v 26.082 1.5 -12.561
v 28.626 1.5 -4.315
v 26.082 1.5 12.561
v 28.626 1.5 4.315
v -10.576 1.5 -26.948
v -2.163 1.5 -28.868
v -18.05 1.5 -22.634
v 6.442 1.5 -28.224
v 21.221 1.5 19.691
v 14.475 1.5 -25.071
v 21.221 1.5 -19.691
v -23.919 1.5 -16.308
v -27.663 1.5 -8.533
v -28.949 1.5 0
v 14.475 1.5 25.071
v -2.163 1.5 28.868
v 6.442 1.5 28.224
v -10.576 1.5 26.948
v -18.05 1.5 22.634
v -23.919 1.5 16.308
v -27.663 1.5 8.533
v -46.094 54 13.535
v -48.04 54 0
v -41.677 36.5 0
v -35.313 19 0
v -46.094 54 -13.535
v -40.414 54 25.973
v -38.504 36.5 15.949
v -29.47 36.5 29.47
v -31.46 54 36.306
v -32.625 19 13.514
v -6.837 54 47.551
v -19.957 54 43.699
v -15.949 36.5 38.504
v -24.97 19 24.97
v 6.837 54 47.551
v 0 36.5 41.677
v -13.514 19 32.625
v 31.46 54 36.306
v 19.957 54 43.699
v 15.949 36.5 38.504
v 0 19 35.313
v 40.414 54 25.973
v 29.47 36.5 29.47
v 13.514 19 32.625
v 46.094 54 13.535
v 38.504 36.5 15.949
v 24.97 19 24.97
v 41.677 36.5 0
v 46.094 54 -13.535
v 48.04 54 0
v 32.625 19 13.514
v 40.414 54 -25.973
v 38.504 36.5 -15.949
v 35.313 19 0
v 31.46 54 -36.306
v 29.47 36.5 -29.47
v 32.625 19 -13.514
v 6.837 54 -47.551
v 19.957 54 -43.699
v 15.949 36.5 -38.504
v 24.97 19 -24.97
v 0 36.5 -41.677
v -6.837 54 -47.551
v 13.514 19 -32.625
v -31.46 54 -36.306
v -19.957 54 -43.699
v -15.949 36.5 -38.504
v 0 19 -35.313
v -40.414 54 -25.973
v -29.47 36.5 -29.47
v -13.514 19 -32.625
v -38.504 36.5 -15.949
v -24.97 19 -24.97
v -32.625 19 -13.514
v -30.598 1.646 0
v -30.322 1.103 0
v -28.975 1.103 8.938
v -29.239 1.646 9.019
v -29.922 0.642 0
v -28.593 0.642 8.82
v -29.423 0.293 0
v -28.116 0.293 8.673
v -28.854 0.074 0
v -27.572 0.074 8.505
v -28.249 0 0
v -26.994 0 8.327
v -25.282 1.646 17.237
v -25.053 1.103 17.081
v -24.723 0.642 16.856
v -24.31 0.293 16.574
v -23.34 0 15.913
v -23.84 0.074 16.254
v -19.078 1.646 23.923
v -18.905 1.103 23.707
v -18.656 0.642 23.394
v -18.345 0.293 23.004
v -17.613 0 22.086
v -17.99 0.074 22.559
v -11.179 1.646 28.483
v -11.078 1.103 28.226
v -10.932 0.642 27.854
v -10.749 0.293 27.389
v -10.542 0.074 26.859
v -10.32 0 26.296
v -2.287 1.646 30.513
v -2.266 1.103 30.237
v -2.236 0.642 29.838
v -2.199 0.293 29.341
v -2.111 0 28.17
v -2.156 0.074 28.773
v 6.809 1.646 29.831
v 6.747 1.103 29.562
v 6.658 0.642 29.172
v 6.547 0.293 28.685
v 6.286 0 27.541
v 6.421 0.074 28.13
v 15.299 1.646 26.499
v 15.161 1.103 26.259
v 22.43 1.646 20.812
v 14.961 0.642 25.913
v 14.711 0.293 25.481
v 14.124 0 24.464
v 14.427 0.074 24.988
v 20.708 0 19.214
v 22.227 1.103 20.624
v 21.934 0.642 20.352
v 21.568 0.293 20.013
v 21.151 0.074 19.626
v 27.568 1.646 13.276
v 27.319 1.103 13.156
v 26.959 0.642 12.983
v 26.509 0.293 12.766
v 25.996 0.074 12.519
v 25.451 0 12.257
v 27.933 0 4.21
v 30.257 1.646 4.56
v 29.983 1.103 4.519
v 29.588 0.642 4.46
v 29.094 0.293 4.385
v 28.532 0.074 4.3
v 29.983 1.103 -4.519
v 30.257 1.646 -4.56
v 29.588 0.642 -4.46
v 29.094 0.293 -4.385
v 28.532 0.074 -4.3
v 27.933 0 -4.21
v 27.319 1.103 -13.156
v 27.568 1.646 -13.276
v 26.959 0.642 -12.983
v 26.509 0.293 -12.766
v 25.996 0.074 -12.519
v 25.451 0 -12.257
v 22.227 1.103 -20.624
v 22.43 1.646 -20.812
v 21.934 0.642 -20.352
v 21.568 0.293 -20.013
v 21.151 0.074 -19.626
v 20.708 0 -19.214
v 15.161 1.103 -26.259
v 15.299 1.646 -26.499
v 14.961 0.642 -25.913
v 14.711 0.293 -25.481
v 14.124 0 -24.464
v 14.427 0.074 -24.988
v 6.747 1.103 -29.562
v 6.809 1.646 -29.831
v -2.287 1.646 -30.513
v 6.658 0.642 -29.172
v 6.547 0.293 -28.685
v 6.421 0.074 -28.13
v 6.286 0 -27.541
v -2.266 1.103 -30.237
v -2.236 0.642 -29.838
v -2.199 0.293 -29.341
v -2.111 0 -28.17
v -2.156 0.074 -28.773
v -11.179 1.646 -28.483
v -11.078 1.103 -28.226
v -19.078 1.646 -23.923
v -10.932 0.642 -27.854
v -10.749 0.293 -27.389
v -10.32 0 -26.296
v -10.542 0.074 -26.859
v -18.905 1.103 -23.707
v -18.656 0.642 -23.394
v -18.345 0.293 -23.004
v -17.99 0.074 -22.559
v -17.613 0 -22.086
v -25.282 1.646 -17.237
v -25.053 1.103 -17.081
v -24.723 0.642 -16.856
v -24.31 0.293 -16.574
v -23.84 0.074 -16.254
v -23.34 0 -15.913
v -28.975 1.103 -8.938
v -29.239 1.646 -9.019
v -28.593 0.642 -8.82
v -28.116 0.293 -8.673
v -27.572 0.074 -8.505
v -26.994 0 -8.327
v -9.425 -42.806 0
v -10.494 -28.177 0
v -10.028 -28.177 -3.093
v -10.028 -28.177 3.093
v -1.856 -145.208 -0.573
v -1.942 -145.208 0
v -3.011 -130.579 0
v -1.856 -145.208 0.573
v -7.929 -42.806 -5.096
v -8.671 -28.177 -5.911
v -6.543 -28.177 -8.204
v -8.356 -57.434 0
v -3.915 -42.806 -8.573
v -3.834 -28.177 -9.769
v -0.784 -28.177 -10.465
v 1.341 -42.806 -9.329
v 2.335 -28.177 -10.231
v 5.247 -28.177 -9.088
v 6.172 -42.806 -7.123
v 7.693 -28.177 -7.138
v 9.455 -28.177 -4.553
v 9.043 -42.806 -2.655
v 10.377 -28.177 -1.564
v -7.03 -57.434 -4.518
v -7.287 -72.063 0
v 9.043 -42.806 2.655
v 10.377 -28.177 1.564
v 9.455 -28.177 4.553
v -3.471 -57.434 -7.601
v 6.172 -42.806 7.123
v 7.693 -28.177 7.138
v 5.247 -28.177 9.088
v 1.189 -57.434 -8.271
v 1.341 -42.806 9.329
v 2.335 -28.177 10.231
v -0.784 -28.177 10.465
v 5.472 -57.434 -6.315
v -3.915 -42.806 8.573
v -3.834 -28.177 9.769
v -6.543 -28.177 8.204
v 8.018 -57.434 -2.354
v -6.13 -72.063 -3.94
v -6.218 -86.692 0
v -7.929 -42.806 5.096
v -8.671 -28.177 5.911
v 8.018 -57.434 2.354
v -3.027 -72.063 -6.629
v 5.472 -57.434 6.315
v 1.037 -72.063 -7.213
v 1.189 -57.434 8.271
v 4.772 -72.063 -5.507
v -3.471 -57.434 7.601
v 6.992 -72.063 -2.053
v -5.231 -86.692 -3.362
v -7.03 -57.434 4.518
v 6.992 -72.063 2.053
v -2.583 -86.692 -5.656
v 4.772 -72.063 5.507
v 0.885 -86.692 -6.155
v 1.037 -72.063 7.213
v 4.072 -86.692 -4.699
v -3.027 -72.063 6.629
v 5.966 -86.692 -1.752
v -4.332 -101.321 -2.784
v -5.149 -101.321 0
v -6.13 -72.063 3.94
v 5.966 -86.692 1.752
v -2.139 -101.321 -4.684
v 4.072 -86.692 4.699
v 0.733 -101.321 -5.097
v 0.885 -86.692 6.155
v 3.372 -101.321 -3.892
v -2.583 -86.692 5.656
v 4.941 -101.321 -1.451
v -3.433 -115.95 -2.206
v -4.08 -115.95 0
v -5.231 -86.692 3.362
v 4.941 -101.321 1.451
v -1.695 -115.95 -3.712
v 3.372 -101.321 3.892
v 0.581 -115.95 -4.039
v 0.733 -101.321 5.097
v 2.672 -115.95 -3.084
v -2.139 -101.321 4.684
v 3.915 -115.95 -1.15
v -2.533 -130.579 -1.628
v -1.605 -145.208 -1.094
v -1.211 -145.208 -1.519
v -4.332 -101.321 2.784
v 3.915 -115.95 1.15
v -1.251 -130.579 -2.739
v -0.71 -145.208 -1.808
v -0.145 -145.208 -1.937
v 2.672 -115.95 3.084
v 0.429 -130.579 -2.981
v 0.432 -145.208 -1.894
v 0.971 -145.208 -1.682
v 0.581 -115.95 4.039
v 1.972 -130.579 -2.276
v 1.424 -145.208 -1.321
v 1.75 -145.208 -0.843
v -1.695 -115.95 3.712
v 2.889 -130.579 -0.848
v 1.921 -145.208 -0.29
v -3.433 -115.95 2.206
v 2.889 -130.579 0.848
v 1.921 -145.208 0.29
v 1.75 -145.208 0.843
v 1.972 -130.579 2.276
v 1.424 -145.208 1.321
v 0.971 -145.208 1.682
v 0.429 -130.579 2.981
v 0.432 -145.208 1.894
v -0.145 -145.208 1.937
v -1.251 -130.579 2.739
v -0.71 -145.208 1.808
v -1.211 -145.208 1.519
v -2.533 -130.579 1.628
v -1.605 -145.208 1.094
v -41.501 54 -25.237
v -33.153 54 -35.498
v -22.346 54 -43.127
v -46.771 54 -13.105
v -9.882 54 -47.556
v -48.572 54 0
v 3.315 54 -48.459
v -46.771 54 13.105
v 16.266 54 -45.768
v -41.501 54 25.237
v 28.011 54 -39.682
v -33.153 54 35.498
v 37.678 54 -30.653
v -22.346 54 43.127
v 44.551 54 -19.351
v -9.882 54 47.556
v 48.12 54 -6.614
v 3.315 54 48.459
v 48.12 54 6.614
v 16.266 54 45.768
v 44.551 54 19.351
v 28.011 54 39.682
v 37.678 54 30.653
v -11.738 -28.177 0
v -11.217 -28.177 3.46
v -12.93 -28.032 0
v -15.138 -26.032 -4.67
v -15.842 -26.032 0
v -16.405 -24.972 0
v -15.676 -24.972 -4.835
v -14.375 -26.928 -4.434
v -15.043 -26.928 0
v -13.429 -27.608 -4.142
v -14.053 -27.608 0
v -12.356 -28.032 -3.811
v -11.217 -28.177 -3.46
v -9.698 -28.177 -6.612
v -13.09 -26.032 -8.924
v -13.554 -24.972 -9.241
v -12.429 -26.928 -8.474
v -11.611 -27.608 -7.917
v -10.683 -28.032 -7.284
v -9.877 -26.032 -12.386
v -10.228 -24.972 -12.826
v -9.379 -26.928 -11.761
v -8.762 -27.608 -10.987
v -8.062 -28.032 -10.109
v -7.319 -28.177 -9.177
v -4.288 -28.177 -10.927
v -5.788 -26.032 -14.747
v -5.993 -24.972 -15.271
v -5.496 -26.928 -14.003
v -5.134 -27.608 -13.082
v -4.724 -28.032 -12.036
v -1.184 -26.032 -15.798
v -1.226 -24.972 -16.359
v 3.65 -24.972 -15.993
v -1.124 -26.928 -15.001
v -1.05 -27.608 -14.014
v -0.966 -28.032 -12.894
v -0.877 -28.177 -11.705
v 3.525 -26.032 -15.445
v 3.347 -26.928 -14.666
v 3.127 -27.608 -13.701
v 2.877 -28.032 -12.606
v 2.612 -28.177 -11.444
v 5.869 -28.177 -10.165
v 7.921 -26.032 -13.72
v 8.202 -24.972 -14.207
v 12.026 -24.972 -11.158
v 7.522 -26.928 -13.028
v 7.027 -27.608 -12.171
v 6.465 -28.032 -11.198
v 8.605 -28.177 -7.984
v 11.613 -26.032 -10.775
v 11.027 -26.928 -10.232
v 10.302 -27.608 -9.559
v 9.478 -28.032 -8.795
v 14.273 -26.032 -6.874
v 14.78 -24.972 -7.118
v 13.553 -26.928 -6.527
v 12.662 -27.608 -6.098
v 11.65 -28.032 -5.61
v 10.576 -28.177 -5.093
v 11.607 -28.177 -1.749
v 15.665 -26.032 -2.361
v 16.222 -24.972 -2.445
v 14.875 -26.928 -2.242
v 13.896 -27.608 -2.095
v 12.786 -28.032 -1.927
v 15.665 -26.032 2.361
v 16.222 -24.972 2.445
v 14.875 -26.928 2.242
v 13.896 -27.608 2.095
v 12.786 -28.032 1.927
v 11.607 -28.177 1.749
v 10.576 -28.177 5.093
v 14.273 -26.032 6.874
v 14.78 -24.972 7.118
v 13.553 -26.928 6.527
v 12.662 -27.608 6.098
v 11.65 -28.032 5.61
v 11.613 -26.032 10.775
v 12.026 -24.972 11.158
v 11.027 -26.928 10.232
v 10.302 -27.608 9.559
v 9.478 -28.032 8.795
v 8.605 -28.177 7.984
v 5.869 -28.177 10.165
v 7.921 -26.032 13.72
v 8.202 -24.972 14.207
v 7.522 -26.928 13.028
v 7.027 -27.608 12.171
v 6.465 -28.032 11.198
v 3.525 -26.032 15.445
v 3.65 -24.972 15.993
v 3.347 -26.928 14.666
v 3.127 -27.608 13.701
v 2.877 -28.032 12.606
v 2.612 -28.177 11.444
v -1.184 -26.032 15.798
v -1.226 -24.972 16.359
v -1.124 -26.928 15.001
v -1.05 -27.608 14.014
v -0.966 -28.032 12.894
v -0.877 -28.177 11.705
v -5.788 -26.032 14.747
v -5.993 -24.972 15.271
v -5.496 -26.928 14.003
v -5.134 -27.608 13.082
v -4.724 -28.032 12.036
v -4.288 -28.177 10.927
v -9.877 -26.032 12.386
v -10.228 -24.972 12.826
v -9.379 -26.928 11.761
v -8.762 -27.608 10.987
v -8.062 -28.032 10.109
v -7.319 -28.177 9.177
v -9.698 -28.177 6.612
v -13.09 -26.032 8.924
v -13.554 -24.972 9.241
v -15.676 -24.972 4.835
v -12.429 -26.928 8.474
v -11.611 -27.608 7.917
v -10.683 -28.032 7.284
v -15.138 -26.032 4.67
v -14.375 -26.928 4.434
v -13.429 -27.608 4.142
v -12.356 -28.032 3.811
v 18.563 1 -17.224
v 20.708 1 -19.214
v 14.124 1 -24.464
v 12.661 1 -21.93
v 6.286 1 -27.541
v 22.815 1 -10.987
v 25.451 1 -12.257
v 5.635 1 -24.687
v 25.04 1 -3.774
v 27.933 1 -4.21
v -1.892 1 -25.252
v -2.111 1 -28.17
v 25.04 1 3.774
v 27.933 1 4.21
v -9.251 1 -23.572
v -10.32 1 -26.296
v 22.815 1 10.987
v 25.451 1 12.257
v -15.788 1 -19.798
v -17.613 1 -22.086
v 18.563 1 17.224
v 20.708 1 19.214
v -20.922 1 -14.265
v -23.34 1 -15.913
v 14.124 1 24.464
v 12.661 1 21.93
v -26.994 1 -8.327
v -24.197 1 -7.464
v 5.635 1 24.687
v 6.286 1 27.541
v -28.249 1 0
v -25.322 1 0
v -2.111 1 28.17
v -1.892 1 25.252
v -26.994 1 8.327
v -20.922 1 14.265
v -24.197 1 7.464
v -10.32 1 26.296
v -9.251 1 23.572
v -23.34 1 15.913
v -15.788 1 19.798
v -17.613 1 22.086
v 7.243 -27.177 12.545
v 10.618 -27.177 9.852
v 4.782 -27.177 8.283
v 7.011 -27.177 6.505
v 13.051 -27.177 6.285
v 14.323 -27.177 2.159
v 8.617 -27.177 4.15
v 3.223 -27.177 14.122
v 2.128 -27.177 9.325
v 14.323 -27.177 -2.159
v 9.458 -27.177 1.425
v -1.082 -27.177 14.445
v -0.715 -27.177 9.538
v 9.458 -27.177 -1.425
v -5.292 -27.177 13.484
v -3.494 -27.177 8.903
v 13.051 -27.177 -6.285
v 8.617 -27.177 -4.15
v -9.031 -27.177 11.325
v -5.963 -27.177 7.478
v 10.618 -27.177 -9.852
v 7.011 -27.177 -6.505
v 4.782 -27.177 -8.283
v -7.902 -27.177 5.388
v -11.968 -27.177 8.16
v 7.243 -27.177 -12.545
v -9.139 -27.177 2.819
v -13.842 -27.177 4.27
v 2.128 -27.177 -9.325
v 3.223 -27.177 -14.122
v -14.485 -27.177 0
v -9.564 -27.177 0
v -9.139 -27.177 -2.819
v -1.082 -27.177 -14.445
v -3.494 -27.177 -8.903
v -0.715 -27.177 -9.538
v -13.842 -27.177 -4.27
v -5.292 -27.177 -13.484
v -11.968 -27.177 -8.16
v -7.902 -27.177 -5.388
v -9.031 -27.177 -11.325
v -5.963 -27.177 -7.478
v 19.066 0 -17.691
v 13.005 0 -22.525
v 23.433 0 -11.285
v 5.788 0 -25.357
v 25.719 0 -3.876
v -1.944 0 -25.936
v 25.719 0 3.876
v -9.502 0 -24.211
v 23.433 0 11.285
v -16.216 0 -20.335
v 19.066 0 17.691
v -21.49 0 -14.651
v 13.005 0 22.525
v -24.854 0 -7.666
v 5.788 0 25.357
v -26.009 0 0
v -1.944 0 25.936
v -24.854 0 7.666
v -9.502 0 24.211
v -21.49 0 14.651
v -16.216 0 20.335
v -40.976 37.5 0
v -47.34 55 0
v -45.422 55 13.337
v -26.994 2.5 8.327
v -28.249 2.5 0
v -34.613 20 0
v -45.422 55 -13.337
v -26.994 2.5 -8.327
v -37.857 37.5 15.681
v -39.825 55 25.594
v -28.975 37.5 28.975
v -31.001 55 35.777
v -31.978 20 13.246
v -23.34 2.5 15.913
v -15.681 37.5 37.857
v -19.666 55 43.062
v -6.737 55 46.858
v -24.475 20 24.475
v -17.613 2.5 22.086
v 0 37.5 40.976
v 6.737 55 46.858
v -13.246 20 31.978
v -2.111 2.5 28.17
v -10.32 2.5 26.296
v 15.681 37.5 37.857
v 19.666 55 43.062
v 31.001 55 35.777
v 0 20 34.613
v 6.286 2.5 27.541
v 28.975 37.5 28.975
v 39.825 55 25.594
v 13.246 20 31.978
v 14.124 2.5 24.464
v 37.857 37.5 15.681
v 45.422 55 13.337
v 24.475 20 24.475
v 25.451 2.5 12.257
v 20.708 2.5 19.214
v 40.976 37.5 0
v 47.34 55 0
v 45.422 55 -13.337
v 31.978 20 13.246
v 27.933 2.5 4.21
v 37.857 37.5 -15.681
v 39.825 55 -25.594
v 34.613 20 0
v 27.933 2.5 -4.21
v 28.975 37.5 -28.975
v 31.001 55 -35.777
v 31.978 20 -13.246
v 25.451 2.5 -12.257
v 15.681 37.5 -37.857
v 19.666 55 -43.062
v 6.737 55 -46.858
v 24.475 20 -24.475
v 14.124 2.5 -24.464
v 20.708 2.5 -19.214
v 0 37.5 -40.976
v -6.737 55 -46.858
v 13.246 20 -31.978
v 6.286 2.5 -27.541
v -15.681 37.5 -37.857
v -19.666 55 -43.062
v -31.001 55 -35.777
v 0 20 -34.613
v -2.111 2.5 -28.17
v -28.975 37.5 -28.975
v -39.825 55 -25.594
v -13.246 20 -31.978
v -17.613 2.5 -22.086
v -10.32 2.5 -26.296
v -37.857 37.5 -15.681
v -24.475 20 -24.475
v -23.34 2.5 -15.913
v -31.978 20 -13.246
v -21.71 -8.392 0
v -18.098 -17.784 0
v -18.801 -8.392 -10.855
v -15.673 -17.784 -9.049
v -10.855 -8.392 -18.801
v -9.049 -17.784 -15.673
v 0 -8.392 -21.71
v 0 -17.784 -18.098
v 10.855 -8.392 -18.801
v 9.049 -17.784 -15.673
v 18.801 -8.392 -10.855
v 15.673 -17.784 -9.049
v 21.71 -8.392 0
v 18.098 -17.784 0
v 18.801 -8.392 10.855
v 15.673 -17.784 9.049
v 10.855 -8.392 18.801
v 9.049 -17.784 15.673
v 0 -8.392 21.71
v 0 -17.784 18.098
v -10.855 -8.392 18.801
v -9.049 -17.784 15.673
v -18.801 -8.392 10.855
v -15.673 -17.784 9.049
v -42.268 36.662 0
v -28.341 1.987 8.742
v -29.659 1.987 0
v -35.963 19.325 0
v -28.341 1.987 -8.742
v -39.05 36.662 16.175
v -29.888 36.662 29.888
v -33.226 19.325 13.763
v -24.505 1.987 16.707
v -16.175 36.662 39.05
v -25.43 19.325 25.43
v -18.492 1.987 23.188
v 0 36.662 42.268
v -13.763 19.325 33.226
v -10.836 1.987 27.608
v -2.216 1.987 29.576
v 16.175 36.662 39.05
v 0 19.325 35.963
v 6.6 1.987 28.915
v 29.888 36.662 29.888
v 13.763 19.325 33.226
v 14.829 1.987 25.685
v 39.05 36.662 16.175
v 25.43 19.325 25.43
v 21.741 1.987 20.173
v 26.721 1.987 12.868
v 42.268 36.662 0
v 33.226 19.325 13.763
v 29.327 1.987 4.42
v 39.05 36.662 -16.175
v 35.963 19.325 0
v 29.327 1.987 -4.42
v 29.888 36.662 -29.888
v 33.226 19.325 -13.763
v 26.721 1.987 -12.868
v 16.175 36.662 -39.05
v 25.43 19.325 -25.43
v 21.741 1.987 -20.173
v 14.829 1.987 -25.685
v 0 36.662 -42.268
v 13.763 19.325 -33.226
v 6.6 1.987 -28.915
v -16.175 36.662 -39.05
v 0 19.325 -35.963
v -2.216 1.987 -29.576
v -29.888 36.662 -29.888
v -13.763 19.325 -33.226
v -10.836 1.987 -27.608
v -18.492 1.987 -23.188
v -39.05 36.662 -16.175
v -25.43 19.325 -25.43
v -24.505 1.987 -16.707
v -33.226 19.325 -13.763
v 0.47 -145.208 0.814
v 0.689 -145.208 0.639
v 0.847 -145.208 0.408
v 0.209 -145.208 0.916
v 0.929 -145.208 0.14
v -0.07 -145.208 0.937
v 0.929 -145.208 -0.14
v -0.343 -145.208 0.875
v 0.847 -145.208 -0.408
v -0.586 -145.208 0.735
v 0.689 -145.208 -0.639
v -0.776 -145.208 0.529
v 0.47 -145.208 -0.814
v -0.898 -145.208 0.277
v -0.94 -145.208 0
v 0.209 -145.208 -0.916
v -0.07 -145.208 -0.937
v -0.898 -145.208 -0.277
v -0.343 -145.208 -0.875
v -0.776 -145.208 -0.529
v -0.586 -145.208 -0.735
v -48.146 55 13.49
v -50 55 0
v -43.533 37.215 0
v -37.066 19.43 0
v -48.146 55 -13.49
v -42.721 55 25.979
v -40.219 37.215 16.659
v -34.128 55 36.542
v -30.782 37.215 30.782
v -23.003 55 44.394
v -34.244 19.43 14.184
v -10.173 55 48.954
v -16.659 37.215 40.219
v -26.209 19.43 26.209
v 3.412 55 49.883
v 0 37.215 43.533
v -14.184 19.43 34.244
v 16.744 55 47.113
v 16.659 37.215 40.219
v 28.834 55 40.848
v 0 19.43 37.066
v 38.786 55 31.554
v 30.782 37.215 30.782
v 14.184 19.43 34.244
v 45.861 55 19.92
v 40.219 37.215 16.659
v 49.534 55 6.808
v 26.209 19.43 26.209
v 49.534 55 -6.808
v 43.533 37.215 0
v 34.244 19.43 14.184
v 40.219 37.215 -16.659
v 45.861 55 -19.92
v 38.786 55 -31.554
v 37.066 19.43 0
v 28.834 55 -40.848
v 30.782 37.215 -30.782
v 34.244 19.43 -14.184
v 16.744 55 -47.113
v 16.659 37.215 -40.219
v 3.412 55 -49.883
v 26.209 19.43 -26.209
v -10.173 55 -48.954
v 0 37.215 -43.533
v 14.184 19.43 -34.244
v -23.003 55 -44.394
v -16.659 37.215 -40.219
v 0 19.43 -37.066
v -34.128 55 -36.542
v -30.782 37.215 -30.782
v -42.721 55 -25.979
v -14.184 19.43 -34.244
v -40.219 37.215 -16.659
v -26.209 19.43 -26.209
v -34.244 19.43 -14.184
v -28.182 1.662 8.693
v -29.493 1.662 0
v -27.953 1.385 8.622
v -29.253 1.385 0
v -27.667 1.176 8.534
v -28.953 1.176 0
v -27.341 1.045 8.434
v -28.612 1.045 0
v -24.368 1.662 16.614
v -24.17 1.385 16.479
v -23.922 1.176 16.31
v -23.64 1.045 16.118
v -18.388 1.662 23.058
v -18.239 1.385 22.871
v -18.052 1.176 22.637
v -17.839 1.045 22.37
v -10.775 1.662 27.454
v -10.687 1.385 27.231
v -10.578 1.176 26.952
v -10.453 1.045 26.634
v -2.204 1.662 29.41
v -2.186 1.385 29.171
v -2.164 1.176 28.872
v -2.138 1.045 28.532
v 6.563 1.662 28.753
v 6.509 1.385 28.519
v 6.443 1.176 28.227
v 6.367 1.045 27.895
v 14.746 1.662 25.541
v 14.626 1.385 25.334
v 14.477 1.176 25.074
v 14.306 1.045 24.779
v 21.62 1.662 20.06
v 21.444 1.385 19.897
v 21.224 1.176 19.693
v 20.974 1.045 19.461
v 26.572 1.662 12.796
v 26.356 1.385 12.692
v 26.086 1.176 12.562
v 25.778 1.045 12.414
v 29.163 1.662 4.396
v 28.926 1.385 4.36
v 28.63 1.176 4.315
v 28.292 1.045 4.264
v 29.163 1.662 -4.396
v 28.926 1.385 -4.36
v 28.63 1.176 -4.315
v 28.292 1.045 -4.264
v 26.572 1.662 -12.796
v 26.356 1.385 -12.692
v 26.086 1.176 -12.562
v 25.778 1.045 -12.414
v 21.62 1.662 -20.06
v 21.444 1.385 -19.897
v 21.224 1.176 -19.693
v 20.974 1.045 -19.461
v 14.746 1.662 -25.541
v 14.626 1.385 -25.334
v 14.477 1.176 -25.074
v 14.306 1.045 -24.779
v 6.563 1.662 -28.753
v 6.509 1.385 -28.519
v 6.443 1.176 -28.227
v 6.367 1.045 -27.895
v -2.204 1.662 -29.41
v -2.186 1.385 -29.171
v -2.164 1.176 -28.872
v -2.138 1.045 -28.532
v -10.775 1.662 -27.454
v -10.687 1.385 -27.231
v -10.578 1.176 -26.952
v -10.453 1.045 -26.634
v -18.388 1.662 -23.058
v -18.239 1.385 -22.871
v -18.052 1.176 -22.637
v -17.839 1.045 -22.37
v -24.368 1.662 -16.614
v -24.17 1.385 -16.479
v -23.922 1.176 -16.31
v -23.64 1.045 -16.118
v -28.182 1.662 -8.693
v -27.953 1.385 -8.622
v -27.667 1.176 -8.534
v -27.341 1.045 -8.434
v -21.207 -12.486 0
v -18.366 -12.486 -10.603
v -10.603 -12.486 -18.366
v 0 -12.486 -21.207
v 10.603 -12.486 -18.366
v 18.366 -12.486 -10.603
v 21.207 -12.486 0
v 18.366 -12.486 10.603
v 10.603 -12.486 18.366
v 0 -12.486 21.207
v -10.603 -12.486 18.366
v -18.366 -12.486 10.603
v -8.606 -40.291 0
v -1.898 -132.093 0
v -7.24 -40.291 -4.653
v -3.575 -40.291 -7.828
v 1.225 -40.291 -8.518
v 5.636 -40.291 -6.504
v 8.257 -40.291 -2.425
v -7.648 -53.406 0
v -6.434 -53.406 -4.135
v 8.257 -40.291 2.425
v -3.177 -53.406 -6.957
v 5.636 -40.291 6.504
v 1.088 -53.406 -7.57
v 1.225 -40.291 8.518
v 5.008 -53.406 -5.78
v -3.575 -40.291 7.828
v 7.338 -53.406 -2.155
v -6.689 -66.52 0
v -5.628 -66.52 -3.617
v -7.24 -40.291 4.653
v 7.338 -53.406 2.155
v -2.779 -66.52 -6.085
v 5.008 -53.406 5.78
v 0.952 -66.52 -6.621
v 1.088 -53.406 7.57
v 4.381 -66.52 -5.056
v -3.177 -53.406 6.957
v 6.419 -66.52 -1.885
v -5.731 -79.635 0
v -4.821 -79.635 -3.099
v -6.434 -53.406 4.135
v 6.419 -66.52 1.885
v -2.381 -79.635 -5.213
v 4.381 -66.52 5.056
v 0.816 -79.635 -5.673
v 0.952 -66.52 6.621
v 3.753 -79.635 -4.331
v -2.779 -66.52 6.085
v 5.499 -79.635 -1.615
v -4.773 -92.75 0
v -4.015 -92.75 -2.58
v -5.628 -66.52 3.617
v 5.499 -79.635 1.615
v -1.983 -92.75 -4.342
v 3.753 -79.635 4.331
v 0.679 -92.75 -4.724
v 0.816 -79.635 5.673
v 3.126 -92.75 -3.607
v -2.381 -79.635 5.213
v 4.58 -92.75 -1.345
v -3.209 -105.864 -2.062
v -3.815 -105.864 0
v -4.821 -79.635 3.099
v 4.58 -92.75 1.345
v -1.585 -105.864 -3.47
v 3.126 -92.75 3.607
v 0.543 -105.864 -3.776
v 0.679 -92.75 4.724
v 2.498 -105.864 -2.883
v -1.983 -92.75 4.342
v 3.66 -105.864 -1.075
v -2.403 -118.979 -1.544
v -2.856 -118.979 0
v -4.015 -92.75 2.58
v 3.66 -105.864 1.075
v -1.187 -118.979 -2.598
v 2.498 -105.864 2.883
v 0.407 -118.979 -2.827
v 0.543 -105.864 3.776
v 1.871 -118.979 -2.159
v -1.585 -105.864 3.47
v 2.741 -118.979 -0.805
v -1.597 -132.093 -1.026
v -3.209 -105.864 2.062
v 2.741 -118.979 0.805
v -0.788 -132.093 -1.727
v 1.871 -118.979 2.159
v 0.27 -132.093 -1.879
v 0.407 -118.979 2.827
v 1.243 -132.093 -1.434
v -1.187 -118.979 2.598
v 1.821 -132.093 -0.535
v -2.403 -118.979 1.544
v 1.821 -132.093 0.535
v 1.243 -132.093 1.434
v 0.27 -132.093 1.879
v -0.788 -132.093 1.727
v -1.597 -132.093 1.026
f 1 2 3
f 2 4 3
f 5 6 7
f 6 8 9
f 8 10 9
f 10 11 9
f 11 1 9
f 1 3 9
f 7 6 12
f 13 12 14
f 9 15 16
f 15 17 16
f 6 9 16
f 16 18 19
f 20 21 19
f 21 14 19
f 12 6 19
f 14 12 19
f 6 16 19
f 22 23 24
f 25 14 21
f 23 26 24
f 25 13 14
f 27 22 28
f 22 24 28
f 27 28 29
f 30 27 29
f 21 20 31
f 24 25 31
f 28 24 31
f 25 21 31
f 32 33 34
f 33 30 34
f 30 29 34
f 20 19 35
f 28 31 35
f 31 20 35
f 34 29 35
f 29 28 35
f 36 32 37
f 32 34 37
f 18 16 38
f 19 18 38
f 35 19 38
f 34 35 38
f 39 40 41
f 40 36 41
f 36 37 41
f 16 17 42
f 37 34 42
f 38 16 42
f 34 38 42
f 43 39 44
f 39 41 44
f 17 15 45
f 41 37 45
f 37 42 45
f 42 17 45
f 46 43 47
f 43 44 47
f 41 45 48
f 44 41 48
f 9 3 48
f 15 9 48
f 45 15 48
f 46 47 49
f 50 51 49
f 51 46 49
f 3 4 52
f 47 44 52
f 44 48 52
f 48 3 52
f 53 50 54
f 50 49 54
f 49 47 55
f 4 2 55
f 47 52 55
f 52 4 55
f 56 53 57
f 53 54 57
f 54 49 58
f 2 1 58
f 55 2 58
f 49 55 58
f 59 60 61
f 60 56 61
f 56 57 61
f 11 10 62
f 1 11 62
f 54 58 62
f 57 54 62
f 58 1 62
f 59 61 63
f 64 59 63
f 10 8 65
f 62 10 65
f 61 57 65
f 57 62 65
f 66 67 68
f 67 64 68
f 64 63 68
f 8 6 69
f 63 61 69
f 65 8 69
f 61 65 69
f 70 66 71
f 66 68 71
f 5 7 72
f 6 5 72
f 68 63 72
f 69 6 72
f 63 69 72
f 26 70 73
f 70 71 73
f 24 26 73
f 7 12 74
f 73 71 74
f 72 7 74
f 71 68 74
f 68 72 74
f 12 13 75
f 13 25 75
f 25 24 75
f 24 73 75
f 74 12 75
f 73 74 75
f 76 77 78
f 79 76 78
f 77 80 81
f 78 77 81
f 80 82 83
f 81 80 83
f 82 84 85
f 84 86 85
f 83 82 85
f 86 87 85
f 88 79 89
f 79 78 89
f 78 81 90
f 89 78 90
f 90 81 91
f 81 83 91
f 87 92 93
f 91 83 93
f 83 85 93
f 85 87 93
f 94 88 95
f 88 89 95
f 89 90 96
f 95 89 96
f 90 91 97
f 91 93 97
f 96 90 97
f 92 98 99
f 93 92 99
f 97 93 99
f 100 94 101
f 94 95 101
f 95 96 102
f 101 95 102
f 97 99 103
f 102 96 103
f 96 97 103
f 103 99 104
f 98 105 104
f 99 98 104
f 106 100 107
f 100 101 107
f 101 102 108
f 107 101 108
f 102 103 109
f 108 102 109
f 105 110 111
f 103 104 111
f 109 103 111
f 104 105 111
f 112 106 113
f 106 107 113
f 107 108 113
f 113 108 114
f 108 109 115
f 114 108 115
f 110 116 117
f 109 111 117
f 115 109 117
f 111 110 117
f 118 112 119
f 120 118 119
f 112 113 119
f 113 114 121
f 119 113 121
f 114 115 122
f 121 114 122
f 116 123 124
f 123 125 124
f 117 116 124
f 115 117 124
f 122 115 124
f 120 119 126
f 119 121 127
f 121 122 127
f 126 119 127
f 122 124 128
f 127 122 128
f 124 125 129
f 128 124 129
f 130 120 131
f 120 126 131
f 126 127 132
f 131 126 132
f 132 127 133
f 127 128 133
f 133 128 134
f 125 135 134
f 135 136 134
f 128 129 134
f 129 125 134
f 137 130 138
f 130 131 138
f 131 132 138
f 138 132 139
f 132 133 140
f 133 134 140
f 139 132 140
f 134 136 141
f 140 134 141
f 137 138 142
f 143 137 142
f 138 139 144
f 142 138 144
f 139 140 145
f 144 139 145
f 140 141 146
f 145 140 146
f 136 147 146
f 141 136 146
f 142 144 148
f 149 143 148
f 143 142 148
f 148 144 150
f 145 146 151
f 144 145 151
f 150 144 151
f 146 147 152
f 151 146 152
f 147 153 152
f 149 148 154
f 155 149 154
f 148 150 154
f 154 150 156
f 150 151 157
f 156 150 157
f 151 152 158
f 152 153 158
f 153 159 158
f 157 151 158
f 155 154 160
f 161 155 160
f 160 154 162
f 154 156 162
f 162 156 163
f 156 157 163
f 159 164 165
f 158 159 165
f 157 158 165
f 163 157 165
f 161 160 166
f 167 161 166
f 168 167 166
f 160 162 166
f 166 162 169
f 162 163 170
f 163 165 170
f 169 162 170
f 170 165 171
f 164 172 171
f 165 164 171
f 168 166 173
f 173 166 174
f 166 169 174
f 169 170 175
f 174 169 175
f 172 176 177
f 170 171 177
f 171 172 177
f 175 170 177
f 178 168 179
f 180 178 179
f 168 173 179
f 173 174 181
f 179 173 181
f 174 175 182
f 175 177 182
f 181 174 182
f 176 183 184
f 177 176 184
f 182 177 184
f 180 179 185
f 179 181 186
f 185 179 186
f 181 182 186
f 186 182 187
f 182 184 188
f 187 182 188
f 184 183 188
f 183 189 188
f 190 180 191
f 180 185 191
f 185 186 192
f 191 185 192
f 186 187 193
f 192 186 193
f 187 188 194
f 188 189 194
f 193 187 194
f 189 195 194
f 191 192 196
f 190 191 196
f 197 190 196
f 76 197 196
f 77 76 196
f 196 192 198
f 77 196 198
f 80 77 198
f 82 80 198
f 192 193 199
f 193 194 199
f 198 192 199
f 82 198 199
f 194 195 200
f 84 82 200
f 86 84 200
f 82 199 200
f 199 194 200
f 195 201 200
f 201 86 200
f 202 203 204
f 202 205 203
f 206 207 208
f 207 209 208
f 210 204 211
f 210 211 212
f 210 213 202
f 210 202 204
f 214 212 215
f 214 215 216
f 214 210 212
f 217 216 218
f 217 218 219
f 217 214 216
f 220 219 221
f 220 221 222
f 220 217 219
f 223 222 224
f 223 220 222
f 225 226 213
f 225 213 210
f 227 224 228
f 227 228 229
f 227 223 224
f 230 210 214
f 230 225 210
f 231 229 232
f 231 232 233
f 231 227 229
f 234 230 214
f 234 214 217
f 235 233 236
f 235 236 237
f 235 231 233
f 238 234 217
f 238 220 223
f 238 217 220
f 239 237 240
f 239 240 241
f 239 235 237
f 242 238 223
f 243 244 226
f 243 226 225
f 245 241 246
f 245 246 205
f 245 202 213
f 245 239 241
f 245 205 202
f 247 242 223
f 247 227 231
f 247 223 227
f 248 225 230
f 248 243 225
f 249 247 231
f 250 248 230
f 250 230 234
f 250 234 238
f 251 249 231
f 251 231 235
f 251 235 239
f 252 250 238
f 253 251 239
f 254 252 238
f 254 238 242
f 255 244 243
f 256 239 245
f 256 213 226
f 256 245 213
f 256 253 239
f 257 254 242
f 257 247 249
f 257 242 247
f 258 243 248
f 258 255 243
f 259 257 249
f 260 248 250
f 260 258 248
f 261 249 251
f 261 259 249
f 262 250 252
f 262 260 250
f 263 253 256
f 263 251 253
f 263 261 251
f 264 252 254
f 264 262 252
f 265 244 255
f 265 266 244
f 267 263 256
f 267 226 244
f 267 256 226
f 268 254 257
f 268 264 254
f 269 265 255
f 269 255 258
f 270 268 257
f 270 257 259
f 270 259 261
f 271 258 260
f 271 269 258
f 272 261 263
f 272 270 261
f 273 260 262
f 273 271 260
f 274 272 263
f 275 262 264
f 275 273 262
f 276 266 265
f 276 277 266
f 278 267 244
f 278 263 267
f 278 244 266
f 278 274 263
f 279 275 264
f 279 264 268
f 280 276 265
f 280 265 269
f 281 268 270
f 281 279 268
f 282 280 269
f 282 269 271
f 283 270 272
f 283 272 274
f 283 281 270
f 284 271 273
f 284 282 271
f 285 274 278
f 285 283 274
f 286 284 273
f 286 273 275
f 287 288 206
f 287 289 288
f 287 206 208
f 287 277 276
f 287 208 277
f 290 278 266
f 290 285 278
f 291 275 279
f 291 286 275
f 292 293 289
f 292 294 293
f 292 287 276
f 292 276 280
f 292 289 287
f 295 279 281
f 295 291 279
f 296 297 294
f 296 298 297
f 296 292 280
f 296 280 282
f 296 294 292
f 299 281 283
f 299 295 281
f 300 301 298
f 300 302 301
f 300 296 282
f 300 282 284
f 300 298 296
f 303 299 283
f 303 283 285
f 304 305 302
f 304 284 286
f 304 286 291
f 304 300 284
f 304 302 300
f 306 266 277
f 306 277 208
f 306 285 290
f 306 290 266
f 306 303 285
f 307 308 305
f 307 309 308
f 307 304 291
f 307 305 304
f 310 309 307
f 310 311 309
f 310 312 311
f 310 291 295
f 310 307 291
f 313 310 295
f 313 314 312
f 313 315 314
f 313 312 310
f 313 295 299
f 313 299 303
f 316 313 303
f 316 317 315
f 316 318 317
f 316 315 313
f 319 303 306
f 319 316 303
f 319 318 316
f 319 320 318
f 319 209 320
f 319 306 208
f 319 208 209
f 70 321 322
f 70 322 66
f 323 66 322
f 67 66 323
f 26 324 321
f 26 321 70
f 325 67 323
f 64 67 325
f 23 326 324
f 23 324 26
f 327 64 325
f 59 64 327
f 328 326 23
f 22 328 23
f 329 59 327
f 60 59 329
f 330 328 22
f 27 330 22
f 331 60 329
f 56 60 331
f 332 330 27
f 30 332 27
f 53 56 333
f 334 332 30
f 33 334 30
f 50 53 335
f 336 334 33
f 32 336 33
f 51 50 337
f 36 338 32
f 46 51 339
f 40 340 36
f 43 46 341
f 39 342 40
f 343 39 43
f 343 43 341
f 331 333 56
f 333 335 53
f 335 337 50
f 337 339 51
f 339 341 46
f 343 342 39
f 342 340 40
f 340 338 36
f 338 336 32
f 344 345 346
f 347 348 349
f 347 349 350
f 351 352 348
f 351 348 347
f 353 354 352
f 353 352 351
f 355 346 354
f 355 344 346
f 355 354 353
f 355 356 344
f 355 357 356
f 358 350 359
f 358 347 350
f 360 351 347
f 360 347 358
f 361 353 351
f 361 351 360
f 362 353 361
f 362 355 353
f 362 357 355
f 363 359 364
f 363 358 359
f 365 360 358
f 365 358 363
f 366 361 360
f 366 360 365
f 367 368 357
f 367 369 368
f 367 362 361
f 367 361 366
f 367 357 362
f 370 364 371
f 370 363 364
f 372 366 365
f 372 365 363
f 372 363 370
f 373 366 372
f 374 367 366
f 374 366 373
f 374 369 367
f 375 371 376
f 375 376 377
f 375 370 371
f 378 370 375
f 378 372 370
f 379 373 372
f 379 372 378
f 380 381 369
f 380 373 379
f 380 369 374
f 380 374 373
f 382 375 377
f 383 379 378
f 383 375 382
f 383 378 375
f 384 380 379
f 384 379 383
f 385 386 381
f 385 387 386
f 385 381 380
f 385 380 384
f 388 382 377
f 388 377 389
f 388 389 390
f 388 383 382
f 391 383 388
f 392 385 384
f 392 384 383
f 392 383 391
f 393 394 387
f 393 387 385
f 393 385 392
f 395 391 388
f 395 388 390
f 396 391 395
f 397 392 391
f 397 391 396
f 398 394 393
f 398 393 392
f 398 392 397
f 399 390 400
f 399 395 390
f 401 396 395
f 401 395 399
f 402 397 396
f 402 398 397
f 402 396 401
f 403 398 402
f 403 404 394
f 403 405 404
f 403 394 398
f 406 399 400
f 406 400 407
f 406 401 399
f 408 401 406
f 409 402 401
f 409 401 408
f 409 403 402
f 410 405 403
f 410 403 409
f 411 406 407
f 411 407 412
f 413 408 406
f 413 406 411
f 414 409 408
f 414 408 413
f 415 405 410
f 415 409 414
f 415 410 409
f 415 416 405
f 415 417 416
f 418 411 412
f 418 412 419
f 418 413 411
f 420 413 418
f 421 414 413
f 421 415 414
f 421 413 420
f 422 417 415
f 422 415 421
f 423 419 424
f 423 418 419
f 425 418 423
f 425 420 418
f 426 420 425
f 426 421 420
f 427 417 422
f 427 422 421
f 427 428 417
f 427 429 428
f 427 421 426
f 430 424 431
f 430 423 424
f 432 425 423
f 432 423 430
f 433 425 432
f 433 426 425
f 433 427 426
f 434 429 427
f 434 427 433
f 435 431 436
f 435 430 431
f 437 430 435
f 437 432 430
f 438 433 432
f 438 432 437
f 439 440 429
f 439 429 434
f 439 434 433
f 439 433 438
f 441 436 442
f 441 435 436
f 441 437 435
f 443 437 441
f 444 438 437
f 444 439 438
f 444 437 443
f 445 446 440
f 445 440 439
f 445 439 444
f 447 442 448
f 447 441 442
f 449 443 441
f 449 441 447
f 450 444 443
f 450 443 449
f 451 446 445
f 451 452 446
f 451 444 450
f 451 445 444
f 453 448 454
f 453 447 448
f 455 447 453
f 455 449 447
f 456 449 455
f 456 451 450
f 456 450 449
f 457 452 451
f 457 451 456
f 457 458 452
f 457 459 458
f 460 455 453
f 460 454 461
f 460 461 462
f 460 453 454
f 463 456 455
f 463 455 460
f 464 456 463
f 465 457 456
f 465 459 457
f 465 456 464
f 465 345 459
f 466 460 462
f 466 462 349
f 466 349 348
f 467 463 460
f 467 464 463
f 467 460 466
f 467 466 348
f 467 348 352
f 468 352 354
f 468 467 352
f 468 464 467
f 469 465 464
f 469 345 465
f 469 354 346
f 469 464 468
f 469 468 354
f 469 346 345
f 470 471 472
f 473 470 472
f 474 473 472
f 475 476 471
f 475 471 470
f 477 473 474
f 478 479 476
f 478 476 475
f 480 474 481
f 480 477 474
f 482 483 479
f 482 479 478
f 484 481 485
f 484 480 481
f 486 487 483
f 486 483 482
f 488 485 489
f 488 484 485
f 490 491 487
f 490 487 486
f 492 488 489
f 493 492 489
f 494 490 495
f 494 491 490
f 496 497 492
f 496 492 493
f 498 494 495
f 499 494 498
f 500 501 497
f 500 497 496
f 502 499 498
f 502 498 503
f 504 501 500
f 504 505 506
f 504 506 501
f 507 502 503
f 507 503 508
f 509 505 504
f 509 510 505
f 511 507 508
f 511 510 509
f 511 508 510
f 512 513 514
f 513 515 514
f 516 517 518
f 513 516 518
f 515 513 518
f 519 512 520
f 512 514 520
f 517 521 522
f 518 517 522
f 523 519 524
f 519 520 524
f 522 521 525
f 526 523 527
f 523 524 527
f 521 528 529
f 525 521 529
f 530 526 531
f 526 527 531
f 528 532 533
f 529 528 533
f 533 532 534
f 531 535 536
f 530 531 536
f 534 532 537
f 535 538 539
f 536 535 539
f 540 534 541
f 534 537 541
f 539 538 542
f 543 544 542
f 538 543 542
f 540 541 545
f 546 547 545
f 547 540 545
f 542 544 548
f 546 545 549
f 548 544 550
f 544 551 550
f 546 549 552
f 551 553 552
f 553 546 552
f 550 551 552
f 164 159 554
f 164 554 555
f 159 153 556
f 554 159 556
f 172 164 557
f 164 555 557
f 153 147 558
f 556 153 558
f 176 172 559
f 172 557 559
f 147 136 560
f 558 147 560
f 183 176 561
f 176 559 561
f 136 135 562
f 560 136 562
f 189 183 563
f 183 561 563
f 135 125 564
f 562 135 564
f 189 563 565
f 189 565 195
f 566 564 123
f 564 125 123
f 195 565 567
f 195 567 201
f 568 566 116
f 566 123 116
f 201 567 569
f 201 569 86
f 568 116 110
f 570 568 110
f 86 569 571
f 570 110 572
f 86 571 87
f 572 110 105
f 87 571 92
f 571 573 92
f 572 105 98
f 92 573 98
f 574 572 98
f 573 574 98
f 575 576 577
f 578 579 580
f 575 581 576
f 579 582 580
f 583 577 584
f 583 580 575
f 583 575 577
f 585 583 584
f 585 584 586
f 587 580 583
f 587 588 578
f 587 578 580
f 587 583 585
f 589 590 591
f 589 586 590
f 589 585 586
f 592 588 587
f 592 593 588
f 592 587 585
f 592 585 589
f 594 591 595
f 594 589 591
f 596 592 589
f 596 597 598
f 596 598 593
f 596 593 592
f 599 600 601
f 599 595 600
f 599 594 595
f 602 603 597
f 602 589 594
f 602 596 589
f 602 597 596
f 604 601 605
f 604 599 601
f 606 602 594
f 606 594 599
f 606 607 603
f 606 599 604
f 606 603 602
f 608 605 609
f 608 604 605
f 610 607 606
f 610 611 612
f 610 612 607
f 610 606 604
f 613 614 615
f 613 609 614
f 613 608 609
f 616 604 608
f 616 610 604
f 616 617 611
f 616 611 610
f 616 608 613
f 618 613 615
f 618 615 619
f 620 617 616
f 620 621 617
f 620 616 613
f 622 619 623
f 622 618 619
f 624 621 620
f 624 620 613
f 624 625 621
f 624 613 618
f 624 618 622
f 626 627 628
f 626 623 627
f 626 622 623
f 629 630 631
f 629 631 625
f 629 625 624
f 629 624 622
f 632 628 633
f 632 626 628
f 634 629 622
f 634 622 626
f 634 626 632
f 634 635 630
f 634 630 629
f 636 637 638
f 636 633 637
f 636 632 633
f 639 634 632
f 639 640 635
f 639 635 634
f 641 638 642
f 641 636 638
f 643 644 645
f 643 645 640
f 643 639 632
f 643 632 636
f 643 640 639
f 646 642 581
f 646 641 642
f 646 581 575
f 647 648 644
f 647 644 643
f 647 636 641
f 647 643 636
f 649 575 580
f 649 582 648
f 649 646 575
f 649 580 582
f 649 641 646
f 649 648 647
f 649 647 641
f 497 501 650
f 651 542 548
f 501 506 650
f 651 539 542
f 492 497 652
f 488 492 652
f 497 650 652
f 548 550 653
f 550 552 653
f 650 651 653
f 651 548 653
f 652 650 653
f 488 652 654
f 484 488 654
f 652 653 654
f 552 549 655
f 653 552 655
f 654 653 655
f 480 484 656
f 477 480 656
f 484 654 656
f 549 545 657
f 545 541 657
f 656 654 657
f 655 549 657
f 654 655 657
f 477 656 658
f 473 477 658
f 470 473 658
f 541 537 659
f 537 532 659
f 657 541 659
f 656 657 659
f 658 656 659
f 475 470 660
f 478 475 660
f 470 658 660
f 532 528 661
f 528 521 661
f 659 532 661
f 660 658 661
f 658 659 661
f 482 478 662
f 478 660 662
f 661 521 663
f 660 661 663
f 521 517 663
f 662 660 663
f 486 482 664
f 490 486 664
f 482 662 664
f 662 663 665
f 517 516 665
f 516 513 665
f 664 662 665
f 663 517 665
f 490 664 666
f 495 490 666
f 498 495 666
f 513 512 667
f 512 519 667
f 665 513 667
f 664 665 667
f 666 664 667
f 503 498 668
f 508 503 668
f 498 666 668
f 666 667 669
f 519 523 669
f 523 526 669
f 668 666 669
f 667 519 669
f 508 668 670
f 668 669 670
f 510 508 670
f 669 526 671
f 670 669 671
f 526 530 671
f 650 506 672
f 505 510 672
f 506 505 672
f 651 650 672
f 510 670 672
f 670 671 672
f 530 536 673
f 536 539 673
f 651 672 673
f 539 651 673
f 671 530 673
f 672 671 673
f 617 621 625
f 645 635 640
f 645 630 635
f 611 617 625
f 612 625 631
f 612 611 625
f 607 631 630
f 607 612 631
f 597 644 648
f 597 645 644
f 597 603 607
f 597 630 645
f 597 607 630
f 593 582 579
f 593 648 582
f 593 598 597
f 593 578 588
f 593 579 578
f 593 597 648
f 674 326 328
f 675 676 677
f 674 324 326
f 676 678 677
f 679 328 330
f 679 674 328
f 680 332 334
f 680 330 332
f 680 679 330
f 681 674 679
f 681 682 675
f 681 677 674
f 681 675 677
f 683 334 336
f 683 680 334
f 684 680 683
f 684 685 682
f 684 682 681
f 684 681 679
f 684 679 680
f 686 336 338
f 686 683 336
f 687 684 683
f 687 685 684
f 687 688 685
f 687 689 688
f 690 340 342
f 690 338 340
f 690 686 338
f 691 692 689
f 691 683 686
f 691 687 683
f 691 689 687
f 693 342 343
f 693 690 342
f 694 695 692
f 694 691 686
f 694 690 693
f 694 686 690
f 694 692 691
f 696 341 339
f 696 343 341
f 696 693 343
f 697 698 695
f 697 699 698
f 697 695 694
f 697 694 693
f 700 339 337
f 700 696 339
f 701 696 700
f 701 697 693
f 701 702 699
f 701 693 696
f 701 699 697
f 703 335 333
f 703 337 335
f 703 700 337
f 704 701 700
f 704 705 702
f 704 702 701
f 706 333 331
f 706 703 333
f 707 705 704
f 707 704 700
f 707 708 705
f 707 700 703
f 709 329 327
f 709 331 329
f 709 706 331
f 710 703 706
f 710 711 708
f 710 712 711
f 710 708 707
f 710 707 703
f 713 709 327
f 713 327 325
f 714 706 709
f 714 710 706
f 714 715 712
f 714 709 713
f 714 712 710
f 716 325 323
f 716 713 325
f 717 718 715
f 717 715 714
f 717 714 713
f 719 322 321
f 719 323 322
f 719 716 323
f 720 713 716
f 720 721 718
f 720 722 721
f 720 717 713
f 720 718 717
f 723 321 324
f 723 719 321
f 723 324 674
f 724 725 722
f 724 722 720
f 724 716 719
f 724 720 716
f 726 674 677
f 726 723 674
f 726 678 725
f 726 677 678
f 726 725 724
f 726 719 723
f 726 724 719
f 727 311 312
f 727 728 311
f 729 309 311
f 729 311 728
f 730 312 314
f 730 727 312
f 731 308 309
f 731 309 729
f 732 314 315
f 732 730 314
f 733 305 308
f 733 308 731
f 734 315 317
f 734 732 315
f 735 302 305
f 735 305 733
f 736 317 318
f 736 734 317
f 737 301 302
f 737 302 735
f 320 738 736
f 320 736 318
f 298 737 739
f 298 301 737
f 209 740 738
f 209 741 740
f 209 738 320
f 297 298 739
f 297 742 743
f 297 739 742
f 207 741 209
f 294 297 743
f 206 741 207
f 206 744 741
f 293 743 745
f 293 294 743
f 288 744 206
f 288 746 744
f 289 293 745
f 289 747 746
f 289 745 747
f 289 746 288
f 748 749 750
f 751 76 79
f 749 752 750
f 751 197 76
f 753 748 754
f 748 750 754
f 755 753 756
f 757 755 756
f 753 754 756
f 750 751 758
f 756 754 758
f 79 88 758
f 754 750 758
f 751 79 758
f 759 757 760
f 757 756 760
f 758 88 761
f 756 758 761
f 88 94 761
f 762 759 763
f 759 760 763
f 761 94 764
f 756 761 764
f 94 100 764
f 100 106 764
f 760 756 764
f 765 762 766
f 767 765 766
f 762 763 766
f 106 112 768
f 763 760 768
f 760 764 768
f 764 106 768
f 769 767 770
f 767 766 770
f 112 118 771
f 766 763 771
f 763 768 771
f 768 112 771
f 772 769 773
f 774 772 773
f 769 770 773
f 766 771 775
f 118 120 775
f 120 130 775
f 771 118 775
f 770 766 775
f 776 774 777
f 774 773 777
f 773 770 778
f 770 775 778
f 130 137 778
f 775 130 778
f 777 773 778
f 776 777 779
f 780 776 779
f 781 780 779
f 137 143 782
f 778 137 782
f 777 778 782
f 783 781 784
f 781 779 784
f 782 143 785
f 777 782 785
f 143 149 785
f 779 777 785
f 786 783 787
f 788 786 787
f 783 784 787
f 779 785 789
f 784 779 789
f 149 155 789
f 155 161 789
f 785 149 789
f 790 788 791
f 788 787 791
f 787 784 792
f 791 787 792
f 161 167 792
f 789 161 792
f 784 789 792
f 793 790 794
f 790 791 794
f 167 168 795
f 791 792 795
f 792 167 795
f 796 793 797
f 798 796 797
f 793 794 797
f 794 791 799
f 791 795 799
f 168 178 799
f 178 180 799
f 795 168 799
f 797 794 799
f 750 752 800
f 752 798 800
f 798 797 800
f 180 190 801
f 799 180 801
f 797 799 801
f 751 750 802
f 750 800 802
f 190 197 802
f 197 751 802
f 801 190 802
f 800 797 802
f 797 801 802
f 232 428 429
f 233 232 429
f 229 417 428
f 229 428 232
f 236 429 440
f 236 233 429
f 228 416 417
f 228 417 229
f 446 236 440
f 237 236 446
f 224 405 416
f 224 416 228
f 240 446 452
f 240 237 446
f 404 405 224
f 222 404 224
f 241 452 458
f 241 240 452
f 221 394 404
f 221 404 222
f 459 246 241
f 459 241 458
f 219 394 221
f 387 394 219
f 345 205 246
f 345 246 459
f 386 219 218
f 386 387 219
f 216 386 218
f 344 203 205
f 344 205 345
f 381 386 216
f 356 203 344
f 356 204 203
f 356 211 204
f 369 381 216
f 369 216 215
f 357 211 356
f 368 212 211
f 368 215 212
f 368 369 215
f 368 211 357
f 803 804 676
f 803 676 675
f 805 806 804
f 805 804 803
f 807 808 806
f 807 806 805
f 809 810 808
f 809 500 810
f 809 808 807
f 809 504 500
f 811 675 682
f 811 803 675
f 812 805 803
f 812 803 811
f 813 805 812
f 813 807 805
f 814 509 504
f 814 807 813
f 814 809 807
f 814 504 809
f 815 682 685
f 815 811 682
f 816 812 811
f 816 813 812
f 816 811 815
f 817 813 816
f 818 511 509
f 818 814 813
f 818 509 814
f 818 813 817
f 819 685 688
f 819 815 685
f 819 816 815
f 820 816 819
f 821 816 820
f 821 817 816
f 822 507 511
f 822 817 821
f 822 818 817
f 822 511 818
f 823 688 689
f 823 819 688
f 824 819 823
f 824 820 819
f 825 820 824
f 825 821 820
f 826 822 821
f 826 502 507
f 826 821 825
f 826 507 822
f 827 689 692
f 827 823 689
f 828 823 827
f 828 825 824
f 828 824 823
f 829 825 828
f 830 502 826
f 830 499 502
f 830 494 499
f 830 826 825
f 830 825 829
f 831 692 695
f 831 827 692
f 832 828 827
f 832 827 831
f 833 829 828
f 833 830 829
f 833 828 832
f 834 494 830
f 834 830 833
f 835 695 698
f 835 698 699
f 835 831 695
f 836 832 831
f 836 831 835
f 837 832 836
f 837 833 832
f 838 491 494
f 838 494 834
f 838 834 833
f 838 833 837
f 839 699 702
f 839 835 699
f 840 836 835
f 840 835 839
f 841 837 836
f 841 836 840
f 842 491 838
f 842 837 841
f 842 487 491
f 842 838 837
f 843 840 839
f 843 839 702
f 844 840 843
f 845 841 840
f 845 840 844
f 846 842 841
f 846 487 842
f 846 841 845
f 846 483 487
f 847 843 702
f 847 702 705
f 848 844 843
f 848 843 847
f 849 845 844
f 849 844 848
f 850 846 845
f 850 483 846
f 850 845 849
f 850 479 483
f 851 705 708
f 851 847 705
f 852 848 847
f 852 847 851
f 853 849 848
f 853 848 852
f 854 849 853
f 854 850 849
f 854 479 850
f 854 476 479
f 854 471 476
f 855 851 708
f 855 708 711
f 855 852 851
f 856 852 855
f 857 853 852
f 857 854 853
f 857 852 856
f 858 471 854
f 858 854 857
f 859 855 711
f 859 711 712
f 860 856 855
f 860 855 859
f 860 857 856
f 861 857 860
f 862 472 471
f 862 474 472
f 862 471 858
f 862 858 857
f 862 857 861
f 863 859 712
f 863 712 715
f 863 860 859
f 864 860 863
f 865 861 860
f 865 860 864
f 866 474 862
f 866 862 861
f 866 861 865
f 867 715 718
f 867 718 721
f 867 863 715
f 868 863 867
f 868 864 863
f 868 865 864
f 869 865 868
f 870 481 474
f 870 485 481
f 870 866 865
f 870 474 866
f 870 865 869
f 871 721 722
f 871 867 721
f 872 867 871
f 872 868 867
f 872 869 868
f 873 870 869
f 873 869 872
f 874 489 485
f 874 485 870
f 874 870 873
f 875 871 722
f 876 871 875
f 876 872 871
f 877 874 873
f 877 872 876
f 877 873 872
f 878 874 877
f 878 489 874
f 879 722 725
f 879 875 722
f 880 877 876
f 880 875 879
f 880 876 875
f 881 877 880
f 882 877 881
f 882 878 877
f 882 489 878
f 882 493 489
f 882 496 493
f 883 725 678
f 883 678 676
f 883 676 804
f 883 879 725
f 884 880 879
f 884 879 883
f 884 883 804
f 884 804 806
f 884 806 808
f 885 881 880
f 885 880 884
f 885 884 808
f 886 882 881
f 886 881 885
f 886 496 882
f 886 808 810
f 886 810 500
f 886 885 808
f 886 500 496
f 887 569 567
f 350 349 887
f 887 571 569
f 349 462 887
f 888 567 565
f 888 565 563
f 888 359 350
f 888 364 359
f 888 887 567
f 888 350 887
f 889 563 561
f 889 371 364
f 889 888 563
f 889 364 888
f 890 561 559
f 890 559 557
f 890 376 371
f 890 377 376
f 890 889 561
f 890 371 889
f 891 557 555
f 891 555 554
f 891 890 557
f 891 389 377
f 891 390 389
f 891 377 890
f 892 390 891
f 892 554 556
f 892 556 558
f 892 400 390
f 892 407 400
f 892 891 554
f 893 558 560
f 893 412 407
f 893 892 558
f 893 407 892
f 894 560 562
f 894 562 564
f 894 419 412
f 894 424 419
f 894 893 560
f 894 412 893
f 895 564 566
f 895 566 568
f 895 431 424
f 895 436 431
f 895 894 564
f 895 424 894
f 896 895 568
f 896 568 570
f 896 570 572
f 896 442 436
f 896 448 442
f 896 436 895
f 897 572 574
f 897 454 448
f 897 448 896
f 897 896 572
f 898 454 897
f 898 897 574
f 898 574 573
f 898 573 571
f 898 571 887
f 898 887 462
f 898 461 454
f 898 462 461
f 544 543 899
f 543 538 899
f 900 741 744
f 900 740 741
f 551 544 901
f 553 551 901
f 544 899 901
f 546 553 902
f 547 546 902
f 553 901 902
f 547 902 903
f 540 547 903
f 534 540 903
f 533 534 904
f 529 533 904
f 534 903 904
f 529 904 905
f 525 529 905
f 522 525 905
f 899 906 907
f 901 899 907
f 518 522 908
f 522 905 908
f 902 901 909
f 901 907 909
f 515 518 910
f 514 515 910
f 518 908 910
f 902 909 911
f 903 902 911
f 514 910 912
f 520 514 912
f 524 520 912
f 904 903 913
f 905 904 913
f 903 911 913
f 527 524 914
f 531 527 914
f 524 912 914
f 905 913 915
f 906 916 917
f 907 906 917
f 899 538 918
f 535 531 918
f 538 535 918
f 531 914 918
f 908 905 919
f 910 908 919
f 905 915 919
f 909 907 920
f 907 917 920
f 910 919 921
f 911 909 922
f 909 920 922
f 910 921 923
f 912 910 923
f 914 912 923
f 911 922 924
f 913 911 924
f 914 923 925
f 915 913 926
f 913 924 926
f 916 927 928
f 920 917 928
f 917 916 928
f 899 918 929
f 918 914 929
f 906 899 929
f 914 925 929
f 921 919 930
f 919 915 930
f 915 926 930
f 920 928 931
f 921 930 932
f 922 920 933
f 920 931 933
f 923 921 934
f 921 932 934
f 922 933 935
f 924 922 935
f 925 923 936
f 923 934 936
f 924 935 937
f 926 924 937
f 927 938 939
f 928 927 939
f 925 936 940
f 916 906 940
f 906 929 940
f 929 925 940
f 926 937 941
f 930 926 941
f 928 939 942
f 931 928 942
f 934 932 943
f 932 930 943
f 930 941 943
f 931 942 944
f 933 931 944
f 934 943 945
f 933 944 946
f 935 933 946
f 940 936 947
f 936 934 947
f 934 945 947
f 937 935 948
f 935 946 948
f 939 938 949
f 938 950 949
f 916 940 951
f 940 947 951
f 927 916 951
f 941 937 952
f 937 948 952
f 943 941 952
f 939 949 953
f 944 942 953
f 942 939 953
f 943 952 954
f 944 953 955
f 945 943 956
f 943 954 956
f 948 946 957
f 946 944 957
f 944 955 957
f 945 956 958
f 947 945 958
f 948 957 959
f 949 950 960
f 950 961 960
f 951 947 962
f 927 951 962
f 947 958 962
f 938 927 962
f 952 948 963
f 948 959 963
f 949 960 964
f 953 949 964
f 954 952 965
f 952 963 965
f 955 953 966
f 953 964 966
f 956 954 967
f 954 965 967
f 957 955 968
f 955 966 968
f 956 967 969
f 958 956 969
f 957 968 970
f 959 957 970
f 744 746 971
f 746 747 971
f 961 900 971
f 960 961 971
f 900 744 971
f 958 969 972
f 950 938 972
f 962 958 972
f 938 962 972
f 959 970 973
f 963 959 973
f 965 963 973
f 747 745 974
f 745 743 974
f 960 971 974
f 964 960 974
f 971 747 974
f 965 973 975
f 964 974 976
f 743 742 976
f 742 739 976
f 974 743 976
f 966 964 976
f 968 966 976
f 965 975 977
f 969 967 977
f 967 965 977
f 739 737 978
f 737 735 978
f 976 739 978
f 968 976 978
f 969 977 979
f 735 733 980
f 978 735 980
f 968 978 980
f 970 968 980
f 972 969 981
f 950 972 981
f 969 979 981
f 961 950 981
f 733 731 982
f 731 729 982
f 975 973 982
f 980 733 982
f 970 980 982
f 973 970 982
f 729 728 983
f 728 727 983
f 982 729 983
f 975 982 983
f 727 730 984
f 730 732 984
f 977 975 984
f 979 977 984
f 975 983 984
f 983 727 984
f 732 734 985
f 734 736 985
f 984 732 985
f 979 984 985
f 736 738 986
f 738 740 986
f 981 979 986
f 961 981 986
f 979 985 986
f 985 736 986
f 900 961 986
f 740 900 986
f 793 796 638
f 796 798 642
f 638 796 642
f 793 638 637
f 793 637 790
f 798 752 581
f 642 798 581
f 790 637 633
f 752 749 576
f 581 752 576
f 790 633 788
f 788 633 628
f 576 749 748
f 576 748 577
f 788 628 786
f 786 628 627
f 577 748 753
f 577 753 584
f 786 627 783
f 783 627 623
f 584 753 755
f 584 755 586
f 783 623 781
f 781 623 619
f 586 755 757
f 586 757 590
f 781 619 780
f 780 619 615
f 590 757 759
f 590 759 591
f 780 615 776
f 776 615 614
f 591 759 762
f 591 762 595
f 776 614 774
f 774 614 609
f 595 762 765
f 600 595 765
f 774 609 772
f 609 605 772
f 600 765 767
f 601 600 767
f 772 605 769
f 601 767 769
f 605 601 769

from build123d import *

# Parameters (mm, degrees)
F2_T = -2.5
F5_R = 2.5
F8_T = -1
F9_R = 5


with BuildPart() as f1:
    # F0 (on Top) → F1 (revolve)
    with BuildSketch(Plane.XY):
        Polygon((-50, 55), (-30, 0), (0, 0), (0, 55), align=None)
    revolve(axis=Axis((0, 27.5, 0), (0, 1, 0)))

    # F2
    f2_openings = [f1.faces().sort_by_distance(p)[0] for p in [
        (0, 55, 0),
    ]]
    offset(amount=F2_T, openings=f2_openings)

    # F3 (on Top) → F4 (revolve)
    with BuildSketch(Plane.XY):
        Polygon((0, -28.1766057014), (0, 0), (-26.0091759264, 0), (-15.1720196009, -28.1766057014), align=None)
    revolve(axis=Axis((0, -44.4323420525, 0), (0, -1, 0)))

    # F5
    f5_edges = [f1.edges().sort_by_distance(p)[0] for p in [
        (30, 0, 0),
    ]]
    fillet(f5_edges, radius=F5_R)

    # F6 (on Top) → F7 (revolve)
    with BuildSketch(Plane.XY):
        Polygon((0, -28.1766057014), (-10.493944336, -28.1766057014), (-1.9424433219, -145.2080160379), (0, -145.2080160379), align=None)
    revolve(axis=Axis((0, -86.6923108697, 0), (0, -1, 0)))

    # F8
    f8_openings = [f1.faces().sort_by_distance(p)[0] for p in [
        (0, -145.208016, 0),
    ]]
    offset(amount=F8_T, openings=f8_openings, kind=Kind.INTERSECTION)

    # F9
    f9_edges = [f1.edges().sort_by_distance(p)[0] for p in [
        (15.17202, -28.176606, 0),
    ]]
    fillet(f9_edges, radius=F9_R)


solid = f1.part
